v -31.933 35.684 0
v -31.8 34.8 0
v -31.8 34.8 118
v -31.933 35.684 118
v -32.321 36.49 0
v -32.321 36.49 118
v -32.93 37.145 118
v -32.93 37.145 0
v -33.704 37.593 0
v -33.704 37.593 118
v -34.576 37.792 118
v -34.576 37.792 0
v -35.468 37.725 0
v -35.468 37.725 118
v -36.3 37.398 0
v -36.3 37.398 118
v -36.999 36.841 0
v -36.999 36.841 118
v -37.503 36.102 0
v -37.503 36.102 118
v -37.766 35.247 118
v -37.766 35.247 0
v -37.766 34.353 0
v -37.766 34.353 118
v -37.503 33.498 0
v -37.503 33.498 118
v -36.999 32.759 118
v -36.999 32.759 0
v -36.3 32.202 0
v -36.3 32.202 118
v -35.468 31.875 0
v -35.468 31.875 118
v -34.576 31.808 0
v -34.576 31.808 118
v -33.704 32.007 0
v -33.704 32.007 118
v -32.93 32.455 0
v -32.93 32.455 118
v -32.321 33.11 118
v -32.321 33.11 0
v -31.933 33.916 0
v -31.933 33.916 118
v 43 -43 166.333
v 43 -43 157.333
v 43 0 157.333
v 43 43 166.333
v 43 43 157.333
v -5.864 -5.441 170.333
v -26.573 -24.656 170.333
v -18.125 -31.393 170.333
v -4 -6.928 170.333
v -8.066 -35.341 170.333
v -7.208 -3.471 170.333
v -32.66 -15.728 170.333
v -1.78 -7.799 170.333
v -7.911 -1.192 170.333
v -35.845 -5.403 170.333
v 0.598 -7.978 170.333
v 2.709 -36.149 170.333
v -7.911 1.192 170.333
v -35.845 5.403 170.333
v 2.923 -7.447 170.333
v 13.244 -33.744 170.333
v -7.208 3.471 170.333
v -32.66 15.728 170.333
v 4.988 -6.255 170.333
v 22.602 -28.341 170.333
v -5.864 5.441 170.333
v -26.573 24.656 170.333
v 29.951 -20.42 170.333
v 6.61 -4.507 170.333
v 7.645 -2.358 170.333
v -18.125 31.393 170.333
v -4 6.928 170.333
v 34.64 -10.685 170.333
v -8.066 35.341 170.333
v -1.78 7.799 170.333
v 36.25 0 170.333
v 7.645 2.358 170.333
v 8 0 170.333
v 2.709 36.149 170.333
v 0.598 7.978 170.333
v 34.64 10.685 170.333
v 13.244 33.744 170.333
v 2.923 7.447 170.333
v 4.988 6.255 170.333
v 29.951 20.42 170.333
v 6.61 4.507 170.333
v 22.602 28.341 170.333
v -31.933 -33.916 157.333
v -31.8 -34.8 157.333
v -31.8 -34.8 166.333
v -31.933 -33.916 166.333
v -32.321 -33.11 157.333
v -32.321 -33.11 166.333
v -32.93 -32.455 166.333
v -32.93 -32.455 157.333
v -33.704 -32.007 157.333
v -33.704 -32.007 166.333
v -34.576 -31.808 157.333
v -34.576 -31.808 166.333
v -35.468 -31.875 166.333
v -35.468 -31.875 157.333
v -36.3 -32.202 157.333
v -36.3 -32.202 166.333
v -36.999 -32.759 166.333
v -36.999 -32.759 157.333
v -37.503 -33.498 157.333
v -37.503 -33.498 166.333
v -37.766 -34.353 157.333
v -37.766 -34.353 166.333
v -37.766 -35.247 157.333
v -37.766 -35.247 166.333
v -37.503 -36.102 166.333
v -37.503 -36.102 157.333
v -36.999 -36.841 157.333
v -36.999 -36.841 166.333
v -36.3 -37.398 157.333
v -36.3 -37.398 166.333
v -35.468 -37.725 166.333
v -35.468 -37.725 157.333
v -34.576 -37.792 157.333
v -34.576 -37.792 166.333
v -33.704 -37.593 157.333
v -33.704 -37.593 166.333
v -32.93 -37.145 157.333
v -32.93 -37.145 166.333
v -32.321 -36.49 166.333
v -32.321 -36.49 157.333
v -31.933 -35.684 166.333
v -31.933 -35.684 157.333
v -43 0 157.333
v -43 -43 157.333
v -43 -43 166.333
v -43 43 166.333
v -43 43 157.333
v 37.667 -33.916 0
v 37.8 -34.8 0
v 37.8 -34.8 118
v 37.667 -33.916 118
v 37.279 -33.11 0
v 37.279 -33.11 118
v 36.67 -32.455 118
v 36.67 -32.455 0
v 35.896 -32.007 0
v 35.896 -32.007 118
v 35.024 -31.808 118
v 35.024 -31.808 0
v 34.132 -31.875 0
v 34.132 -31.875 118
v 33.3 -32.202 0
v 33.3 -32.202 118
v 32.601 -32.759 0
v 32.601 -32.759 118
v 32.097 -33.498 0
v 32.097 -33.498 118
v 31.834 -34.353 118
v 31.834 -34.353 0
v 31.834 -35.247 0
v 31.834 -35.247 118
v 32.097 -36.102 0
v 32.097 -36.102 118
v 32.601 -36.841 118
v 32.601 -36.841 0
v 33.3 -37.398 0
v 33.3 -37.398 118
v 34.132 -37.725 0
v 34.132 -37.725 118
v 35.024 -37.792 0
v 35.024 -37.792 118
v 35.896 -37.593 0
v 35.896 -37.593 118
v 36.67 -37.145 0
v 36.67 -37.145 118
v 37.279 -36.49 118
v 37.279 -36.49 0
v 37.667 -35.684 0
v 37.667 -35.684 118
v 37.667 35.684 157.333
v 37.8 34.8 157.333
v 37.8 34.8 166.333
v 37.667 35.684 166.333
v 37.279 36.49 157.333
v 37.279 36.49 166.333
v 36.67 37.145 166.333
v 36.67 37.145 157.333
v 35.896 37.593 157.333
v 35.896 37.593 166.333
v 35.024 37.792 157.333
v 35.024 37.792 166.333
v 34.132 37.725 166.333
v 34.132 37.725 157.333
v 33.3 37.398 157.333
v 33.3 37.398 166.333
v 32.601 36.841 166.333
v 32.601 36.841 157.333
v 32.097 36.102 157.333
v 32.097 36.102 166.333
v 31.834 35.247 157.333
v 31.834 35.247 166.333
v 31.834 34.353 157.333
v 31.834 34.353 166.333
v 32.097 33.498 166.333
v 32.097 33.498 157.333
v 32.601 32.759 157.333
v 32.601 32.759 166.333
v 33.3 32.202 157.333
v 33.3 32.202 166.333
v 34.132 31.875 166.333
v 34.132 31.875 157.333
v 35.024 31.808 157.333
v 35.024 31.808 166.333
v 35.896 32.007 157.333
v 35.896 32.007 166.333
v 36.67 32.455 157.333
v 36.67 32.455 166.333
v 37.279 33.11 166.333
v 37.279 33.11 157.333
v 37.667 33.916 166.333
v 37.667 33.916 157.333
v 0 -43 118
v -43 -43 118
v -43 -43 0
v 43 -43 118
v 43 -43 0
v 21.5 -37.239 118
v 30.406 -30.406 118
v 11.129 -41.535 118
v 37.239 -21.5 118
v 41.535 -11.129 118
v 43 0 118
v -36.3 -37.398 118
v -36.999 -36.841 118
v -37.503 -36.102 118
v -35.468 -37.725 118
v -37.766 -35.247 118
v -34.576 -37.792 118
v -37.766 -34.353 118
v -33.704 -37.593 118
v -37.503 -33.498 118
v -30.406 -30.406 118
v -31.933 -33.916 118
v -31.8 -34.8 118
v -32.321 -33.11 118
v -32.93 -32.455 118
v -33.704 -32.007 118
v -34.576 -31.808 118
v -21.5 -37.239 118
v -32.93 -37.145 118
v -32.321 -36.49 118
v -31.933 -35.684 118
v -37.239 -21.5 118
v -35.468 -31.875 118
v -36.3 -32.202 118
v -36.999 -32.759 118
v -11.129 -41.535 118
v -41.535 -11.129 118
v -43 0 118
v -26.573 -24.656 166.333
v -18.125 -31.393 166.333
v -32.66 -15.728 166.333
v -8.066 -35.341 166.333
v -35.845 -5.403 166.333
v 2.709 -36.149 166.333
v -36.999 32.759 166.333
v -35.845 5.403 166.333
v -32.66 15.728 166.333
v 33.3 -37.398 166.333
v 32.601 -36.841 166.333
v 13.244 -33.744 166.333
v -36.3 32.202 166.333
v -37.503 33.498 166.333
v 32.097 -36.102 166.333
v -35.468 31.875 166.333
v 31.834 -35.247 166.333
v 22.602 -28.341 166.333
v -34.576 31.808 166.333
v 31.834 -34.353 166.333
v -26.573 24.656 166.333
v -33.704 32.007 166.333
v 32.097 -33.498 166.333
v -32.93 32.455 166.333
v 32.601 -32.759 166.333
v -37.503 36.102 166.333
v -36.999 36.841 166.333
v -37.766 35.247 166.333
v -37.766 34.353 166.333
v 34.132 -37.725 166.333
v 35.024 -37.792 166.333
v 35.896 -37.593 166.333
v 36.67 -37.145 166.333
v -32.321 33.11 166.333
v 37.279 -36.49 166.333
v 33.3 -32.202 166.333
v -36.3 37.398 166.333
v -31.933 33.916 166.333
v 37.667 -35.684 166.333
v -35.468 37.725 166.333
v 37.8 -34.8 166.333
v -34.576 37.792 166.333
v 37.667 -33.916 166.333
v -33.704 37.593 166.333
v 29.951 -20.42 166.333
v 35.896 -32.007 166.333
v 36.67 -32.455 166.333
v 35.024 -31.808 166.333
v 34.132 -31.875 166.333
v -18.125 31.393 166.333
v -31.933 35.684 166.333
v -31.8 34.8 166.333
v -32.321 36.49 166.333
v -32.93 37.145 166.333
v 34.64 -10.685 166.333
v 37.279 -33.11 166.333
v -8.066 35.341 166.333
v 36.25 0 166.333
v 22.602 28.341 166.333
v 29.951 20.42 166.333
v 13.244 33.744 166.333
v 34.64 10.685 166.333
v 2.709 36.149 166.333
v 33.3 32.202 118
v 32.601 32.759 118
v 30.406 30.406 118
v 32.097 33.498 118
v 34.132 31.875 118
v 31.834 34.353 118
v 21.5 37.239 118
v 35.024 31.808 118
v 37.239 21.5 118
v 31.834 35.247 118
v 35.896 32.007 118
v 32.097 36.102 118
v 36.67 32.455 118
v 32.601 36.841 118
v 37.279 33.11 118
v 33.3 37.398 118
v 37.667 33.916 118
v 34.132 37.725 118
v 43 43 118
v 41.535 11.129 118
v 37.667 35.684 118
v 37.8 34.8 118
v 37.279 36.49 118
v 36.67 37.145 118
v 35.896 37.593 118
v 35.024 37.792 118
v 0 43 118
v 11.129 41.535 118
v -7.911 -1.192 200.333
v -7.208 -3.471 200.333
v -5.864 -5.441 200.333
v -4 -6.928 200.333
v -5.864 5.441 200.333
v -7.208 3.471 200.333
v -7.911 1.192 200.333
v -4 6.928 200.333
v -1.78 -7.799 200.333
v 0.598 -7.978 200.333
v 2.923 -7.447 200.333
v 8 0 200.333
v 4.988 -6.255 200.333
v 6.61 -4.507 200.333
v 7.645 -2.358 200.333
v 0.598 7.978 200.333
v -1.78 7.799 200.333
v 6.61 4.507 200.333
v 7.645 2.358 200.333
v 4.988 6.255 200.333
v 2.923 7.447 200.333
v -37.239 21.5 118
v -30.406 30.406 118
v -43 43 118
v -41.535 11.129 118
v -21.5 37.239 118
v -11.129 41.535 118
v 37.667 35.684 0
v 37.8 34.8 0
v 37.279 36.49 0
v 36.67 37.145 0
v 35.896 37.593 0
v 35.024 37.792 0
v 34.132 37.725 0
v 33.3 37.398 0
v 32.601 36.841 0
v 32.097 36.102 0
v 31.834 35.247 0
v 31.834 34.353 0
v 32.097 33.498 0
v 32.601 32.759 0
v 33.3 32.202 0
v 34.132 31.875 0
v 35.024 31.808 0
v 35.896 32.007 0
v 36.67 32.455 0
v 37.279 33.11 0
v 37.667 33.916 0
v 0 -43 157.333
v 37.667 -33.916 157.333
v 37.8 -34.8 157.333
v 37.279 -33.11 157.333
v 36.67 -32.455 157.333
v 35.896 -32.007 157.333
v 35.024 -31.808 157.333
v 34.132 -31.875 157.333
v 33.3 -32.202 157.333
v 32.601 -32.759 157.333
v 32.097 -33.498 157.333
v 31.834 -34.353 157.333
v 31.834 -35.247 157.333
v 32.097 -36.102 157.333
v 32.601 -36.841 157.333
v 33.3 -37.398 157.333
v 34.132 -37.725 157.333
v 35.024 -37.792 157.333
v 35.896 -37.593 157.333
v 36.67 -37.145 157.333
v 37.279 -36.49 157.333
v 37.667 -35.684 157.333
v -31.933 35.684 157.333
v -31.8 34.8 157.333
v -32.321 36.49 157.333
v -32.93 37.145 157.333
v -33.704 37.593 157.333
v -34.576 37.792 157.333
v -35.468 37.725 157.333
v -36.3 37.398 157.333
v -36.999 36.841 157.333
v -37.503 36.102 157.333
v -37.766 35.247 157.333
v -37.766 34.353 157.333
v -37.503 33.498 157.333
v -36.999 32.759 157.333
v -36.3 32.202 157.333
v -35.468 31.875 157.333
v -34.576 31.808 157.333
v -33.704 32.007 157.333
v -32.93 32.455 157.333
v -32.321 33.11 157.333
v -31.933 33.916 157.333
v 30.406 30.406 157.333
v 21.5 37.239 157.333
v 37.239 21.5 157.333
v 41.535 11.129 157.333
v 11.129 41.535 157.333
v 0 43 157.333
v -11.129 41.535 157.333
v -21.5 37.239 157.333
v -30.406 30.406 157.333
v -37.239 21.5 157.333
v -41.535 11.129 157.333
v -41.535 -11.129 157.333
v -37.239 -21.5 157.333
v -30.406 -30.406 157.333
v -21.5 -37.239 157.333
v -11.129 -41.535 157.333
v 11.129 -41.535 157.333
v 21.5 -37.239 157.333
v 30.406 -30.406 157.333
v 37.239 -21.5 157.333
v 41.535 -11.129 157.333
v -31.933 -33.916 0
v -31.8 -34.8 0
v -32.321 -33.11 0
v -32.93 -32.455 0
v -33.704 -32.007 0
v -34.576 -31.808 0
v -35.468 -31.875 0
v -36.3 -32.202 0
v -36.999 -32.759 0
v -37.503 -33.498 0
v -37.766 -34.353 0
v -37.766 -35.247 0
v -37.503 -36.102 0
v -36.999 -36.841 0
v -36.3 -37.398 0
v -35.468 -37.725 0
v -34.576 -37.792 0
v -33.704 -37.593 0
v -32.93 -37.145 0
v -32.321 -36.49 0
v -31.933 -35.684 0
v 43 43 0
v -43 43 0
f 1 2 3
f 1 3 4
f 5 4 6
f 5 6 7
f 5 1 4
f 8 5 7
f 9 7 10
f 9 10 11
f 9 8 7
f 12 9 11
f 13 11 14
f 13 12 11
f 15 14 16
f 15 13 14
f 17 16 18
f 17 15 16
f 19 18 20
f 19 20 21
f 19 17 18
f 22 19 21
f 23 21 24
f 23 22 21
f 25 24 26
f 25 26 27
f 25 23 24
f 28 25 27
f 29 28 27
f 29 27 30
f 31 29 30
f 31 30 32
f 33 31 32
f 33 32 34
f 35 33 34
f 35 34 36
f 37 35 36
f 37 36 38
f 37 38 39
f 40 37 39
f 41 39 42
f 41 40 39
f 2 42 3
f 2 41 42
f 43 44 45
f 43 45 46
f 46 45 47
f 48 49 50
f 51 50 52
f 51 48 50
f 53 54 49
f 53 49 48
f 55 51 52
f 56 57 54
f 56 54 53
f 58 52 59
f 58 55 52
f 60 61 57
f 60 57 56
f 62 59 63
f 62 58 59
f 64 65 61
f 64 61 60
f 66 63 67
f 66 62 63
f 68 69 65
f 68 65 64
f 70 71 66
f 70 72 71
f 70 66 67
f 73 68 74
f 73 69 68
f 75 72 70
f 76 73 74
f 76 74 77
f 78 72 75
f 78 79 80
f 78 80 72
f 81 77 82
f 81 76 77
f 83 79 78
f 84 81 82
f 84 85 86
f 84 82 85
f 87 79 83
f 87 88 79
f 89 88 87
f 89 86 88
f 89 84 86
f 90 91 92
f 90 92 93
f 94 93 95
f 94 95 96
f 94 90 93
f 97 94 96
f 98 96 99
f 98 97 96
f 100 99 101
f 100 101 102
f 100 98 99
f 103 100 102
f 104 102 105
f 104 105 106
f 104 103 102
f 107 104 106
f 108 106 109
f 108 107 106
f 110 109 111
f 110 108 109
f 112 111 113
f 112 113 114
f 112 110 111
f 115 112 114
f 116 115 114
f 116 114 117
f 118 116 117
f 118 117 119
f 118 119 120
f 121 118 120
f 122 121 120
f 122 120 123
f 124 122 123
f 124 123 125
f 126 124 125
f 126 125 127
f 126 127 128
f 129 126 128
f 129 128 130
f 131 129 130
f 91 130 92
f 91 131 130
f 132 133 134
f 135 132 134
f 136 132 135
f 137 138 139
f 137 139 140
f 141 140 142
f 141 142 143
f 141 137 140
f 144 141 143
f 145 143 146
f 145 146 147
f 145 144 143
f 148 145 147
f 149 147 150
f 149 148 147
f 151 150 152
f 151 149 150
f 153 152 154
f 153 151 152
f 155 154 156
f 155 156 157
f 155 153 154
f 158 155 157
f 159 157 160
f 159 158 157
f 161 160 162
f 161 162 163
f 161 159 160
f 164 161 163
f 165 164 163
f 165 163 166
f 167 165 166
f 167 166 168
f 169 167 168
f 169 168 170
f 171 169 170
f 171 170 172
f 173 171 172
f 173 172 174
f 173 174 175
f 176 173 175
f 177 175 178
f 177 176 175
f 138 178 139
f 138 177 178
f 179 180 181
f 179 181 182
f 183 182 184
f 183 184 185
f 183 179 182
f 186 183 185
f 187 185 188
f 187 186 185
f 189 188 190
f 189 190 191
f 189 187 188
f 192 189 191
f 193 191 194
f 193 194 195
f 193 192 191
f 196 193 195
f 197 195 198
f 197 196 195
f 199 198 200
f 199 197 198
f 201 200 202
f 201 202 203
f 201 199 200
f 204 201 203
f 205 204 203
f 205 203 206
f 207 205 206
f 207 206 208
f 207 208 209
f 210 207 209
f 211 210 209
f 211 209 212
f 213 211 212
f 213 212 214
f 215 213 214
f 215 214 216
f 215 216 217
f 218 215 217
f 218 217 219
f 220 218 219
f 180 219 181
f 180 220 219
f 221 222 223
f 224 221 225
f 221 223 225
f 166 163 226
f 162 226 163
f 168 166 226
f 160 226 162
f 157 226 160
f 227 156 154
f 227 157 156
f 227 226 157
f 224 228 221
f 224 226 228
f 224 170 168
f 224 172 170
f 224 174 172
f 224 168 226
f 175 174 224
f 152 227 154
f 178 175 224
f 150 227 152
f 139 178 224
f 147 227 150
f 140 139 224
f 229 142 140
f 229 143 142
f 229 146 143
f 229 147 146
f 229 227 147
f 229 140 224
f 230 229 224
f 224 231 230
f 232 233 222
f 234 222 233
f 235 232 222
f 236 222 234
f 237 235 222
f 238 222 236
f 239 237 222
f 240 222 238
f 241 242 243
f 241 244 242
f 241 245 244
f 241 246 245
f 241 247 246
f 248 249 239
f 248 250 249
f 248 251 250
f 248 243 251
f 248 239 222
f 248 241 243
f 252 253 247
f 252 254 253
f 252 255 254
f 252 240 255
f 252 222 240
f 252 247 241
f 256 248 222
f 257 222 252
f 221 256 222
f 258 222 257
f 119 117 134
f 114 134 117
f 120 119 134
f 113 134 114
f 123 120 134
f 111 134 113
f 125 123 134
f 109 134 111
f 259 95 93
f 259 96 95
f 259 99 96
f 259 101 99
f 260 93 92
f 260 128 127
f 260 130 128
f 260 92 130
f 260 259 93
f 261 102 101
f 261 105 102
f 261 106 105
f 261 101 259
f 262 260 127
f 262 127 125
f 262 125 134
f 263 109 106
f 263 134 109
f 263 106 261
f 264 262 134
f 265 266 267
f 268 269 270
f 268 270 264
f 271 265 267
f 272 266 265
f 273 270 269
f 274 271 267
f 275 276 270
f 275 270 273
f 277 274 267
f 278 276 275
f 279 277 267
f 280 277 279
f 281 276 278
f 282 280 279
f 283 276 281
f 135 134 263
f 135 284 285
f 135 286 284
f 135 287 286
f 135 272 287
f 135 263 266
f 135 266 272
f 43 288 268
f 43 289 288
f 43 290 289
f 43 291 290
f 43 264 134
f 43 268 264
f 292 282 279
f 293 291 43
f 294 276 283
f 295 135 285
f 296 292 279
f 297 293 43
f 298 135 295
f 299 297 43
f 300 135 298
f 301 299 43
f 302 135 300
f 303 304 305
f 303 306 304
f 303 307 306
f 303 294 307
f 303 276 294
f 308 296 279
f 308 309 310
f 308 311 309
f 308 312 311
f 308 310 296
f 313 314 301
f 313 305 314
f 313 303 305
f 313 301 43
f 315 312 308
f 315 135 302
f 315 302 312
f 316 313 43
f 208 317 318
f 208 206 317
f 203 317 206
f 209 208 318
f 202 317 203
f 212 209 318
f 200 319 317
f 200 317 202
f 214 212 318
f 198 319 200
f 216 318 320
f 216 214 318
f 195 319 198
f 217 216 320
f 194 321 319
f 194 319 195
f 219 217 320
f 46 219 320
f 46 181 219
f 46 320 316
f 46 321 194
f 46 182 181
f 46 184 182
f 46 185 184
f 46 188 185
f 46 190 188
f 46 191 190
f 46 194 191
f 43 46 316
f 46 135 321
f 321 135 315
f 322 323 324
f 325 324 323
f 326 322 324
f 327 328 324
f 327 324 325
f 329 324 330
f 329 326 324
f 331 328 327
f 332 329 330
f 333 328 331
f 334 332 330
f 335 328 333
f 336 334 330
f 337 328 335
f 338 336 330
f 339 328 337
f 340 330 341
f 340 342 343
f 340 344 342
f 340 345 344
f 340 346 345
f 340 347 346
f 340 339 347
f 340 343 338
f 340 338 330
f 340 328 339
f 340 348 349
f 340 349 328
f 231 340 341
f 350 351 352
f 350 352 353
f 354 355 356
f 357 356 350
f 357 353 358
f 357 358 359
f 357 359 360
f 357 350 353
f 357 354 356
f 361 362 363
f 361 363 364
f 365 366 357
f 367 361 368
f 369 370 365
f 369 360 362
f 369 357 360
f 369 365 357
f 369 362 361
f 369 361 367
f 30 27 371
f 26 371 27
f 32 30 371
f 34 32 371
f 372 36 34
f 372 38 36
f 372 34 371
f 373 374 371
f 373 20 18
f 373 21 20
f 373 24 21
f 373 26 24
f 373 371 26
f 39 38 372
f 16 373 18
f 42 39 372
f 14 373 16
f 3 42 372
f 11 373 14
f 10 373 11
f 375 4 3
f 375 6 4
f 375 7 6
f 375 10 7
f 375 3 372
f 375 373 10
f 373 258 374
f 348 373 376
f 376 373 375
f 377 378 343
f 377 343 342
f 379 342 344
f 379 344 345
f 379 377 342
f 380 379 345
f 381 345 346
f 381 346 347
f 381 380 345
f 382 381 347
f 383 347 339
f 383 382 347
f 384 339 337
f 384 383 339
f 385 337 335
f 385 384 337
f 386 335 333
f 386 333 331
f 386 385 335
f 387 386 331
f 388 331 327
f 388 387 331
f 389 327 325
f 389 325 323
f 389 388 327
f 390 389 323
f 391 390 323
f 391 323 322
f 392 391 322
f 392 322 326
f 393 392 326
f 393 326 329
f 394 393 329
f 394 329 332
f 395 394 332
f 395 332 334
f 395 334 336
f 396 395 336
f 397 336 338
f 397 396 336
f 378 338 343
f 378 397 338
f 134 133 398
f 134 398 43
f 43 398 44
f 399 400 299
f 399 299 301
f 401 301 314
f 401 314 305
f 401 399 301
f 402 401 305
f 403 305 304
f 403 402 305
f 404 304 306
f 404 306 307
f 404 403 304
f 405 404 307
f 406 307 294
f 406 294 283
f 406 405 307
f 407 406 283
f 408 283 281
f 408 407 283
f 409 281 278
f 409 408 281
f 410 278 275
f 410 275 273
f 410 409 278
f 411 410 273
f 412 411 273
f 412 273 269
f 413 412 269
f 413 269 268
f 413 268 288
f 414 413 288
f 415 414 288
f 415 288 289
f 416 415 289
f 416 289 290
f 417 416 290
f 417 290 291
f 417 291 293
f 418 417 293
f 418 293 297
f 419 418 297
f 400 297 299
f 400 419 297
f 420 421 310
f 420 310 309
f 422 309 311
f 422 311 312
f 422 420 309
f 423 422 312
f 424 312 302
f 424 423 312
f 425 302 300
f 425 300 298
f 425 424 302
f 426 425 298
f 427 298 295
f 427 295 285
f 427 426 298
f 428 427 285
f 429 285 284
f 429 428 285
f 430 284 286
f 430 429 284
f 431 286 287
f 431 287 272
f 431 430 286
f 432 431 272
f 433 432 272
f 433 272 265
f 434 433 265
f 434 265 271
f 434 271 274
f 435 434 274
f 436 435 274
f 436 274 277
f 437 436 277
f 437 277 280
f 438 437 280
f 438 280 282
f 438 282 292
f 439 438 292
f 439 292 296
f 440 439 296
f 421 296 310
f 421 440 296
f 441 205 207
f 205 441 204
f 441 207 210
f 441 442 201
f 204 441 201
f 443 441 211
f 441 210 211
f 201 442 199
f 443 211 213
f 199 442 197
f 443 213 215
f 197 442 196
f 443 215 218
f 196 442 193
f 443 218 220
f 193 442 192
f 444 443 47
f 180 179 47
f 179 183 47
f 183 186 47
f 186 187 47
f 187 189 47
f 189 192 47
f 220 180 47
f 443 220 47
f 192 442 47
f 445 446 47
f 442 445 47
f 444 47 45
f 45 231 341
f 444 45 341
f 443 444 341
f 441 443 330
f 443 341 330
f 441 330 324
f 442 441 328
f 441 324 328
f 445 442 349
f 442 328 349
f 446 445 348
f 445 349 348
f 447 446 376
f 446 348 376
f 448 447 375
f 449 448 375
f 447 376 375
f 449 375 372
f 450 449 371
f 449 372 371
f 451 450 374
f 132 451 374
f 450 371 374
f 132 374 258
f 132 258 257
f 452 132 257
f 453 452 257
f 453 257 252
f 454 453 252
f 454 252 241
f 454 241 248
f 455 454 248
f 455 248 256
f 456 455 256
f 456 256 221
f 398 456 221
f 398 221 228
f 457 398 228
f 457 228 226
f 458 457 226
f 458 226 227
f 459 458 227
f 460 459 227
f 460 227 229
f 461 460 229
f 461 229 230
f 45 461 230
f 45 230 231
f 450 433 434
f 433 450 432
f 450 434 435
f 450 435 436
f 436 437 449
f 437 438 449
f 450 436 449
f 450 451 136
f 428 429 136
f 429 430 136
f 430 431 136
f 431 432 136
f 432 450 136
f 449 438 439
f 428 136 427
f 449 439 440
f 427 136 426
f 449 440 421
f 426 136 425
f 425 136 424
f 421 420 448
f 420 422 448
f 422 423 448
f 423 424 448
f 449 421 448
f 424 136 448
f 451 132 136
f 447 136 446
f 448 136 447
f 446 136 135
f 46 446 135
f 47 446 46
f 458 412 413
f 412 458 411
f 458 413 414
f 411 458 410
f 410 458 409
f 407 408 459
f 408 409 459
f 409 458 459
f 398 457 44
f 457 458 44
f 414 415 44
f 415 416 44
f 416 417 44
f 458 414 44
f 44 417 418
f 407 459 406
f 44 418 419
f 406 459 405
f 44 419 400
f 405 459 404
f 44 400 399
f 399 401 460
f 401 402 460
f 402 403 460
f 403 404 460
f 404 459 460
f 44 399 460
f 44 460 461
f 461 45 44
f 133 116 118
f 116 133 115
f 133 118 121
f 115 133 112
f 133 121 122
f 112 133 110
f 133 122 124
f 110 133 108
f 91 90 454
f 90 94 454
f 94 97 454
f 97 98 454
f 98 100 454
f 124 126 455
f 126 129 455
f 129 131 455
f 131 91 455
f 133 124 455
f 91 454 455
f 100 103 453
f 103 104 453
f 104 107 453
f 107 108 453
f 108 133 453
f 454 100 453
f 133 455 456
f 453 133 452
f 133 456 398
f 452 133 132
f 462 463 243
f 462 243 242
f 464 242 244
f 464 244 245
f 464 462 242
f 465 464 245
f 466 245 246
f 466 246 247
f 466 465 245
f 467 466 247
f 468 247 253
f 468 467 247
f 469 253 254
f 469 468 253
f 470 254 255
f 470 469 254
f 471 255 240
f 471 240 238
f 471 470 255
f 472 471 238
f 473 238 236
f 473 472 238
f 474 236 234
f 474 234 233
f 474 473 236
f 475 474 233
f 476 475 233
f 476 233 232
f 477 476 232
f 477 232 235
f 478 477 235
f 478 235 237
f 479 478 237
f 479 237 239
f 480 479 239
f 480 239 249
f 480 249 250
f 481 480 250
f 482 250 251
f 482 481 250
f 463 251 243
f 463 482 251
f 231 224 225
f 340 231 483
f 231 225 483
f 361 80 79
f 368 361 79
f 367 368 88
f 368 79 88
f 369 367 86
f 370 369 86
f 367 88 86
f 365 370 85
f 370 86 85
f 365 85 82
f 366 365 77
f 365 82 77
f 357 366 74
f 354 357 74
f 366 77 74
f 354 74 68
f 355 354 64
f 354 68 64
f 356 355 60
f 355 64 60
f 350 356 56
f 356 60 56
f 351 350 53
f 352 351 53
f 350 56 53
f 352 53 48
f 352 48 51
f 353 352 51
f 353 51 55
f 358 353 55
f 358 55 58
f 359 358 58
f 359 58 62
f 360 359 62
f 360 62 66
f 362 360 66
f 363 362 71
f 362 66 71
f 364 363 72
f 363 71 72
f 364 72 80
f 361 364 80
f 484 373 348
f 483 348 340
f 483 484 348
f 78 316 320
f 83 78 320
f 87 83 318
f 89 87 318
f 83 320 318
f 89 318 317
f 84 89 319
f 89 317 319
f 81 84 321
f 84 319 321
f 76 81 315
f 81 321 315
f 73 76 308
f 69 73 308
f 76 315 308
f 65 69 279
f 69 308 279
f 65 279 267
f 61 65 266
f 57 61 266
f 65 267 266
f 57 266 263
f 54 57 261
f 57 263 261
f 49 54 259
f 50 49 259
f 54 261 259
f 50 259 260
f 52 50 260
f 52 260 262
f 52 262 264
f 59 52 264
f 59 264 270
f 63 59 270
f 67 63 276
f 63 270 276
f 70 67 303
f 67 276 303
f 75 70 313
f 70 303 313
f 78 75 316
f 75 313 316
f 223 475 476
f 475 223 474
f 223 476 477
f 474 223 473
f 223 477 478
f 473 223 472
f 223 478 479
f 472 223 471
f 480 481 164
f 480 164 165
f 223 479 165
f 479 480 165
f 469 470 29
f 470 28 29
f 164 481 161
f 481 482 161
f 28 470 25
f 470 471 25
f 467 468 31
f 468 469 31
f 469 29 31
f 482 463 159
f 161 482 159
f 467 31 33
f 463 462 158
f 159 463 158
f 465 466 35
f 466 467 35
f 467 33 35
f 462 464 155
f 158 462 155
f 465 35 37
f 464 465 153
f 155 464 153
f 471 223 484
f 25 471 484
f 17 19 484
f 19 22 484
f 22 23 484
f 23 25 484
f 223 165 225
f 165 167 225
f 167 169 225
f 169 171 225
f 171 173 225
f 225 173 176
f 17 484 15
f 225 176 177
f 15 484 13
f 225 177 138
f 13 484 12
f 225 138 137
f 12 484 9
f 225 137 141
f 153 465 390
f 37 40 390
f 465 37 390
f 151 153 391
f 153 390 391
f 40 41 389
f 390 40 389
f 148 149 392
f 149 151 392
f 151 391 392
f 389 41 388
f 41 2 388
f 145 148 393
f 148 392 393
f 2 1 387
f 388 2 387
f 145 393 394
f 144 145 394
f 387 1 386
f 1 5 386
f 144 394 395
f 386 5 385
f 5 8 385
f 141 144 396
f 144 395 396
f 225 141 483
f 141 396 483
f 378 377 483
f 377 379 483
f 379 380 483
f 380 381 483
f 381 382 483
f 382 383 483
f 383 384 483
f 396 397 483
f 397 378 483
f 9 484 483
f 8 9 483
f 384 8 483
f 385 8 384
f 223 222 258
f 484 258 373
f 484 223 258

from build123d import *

# Parameters (mm, degrees)
SKETCH_1_W      = 86
SKETCH_1_H      = 86
SKETCH_1_R      = 3
EXTRUDE_1_DEPTH = 118
SKETCH_2_R      = 43
EXTRUDE_2_DEPTH = 39.333333333
SKETCH_3_W      = 86
SKETCH_3_H      = 86
SKETCH_3_R      = 3
EXTRUDE_3_DEPTH = 9
SKETCH_4_R      = 36.25
EXTRUDE_4_DEPTH = 4
SKETCH_5_R      = 8
EXTRUDE_5_DEPTH = 30


with BuildPart() as part:
    # 草图1 → 凸台-拉伸1 (new body)
    with BuildSketch(Plane.XY):
        Rectangle(SKETCH_1_W, SKETCH_1_H)
        with Locations((-34.8, 34.8)):
            Circle(SKETCH_1_R, mode=Mode.SUBTRACT)
        with Locations((34.8, 34.8)):
            Circle(SKETCH_1_R, mode=Mode.SUBTRACT)
        with Locations((34.8, -34.8)):
            Circle(SKETCH_1_R, mode=Mode.SUBTRACT)
        with Locations((-34.8, -34.8)):
            Circle(SKETCH_1_R, mode=Mode.SUBTRACT)
    extrude(amount=EXTRUDE_1_DEPTH)

    # 草图2 → 凸台-拉伸2 (add)
    with BuildSketch(Plane.XY.offset(118)):
        Circle(SKETCH_2_R)
    extrude(amount=EXTRUDE_2_DEPTH)

    # 草图3 → 凸台-拉伸3 (add)
    with BuildSketch(Plane.XY.offset(157.333333333)):
        Rectangle(SKETCH_3_W, SKETCH_3_H)
        with Locations((-34.8, 34.8)):
            Circle(SKETCH_3_R, mode=Mode.SUBTRACT)
        with Locations((34.8, 34.8)):
            Circle(SKETCH_3_R, mode=Mode.SUBTRACT)
        with Locations((34.8, -34.8)):
            Circle(SKETCH_3_R, mode=Mode.SUBTRACT)
        with Locations((-34.8, -34.8)):
            Circle(SKETCH_3_R, mode=Mode.SUBTRACT)
    extrude(amount=EXTRUDE_3_DEPTH)

    # 草图4 → 凸台-拉伸4 (add)
    with BuildSketch(Plane.XY.offset(166.333333333)):
        Circle(SKETCH_4_R)
    extrude(amount=EXTRUDE_4_DEPTH)

    # 草图5 → 凸台-拉伸5 (add)
    with BuildSketch(Plane.XY.offset(170.333333333)):
        Circle(SKETCH_5_R)
    extrude(amount=EXTRUDE_5_DEPTH)


solid = part.part
